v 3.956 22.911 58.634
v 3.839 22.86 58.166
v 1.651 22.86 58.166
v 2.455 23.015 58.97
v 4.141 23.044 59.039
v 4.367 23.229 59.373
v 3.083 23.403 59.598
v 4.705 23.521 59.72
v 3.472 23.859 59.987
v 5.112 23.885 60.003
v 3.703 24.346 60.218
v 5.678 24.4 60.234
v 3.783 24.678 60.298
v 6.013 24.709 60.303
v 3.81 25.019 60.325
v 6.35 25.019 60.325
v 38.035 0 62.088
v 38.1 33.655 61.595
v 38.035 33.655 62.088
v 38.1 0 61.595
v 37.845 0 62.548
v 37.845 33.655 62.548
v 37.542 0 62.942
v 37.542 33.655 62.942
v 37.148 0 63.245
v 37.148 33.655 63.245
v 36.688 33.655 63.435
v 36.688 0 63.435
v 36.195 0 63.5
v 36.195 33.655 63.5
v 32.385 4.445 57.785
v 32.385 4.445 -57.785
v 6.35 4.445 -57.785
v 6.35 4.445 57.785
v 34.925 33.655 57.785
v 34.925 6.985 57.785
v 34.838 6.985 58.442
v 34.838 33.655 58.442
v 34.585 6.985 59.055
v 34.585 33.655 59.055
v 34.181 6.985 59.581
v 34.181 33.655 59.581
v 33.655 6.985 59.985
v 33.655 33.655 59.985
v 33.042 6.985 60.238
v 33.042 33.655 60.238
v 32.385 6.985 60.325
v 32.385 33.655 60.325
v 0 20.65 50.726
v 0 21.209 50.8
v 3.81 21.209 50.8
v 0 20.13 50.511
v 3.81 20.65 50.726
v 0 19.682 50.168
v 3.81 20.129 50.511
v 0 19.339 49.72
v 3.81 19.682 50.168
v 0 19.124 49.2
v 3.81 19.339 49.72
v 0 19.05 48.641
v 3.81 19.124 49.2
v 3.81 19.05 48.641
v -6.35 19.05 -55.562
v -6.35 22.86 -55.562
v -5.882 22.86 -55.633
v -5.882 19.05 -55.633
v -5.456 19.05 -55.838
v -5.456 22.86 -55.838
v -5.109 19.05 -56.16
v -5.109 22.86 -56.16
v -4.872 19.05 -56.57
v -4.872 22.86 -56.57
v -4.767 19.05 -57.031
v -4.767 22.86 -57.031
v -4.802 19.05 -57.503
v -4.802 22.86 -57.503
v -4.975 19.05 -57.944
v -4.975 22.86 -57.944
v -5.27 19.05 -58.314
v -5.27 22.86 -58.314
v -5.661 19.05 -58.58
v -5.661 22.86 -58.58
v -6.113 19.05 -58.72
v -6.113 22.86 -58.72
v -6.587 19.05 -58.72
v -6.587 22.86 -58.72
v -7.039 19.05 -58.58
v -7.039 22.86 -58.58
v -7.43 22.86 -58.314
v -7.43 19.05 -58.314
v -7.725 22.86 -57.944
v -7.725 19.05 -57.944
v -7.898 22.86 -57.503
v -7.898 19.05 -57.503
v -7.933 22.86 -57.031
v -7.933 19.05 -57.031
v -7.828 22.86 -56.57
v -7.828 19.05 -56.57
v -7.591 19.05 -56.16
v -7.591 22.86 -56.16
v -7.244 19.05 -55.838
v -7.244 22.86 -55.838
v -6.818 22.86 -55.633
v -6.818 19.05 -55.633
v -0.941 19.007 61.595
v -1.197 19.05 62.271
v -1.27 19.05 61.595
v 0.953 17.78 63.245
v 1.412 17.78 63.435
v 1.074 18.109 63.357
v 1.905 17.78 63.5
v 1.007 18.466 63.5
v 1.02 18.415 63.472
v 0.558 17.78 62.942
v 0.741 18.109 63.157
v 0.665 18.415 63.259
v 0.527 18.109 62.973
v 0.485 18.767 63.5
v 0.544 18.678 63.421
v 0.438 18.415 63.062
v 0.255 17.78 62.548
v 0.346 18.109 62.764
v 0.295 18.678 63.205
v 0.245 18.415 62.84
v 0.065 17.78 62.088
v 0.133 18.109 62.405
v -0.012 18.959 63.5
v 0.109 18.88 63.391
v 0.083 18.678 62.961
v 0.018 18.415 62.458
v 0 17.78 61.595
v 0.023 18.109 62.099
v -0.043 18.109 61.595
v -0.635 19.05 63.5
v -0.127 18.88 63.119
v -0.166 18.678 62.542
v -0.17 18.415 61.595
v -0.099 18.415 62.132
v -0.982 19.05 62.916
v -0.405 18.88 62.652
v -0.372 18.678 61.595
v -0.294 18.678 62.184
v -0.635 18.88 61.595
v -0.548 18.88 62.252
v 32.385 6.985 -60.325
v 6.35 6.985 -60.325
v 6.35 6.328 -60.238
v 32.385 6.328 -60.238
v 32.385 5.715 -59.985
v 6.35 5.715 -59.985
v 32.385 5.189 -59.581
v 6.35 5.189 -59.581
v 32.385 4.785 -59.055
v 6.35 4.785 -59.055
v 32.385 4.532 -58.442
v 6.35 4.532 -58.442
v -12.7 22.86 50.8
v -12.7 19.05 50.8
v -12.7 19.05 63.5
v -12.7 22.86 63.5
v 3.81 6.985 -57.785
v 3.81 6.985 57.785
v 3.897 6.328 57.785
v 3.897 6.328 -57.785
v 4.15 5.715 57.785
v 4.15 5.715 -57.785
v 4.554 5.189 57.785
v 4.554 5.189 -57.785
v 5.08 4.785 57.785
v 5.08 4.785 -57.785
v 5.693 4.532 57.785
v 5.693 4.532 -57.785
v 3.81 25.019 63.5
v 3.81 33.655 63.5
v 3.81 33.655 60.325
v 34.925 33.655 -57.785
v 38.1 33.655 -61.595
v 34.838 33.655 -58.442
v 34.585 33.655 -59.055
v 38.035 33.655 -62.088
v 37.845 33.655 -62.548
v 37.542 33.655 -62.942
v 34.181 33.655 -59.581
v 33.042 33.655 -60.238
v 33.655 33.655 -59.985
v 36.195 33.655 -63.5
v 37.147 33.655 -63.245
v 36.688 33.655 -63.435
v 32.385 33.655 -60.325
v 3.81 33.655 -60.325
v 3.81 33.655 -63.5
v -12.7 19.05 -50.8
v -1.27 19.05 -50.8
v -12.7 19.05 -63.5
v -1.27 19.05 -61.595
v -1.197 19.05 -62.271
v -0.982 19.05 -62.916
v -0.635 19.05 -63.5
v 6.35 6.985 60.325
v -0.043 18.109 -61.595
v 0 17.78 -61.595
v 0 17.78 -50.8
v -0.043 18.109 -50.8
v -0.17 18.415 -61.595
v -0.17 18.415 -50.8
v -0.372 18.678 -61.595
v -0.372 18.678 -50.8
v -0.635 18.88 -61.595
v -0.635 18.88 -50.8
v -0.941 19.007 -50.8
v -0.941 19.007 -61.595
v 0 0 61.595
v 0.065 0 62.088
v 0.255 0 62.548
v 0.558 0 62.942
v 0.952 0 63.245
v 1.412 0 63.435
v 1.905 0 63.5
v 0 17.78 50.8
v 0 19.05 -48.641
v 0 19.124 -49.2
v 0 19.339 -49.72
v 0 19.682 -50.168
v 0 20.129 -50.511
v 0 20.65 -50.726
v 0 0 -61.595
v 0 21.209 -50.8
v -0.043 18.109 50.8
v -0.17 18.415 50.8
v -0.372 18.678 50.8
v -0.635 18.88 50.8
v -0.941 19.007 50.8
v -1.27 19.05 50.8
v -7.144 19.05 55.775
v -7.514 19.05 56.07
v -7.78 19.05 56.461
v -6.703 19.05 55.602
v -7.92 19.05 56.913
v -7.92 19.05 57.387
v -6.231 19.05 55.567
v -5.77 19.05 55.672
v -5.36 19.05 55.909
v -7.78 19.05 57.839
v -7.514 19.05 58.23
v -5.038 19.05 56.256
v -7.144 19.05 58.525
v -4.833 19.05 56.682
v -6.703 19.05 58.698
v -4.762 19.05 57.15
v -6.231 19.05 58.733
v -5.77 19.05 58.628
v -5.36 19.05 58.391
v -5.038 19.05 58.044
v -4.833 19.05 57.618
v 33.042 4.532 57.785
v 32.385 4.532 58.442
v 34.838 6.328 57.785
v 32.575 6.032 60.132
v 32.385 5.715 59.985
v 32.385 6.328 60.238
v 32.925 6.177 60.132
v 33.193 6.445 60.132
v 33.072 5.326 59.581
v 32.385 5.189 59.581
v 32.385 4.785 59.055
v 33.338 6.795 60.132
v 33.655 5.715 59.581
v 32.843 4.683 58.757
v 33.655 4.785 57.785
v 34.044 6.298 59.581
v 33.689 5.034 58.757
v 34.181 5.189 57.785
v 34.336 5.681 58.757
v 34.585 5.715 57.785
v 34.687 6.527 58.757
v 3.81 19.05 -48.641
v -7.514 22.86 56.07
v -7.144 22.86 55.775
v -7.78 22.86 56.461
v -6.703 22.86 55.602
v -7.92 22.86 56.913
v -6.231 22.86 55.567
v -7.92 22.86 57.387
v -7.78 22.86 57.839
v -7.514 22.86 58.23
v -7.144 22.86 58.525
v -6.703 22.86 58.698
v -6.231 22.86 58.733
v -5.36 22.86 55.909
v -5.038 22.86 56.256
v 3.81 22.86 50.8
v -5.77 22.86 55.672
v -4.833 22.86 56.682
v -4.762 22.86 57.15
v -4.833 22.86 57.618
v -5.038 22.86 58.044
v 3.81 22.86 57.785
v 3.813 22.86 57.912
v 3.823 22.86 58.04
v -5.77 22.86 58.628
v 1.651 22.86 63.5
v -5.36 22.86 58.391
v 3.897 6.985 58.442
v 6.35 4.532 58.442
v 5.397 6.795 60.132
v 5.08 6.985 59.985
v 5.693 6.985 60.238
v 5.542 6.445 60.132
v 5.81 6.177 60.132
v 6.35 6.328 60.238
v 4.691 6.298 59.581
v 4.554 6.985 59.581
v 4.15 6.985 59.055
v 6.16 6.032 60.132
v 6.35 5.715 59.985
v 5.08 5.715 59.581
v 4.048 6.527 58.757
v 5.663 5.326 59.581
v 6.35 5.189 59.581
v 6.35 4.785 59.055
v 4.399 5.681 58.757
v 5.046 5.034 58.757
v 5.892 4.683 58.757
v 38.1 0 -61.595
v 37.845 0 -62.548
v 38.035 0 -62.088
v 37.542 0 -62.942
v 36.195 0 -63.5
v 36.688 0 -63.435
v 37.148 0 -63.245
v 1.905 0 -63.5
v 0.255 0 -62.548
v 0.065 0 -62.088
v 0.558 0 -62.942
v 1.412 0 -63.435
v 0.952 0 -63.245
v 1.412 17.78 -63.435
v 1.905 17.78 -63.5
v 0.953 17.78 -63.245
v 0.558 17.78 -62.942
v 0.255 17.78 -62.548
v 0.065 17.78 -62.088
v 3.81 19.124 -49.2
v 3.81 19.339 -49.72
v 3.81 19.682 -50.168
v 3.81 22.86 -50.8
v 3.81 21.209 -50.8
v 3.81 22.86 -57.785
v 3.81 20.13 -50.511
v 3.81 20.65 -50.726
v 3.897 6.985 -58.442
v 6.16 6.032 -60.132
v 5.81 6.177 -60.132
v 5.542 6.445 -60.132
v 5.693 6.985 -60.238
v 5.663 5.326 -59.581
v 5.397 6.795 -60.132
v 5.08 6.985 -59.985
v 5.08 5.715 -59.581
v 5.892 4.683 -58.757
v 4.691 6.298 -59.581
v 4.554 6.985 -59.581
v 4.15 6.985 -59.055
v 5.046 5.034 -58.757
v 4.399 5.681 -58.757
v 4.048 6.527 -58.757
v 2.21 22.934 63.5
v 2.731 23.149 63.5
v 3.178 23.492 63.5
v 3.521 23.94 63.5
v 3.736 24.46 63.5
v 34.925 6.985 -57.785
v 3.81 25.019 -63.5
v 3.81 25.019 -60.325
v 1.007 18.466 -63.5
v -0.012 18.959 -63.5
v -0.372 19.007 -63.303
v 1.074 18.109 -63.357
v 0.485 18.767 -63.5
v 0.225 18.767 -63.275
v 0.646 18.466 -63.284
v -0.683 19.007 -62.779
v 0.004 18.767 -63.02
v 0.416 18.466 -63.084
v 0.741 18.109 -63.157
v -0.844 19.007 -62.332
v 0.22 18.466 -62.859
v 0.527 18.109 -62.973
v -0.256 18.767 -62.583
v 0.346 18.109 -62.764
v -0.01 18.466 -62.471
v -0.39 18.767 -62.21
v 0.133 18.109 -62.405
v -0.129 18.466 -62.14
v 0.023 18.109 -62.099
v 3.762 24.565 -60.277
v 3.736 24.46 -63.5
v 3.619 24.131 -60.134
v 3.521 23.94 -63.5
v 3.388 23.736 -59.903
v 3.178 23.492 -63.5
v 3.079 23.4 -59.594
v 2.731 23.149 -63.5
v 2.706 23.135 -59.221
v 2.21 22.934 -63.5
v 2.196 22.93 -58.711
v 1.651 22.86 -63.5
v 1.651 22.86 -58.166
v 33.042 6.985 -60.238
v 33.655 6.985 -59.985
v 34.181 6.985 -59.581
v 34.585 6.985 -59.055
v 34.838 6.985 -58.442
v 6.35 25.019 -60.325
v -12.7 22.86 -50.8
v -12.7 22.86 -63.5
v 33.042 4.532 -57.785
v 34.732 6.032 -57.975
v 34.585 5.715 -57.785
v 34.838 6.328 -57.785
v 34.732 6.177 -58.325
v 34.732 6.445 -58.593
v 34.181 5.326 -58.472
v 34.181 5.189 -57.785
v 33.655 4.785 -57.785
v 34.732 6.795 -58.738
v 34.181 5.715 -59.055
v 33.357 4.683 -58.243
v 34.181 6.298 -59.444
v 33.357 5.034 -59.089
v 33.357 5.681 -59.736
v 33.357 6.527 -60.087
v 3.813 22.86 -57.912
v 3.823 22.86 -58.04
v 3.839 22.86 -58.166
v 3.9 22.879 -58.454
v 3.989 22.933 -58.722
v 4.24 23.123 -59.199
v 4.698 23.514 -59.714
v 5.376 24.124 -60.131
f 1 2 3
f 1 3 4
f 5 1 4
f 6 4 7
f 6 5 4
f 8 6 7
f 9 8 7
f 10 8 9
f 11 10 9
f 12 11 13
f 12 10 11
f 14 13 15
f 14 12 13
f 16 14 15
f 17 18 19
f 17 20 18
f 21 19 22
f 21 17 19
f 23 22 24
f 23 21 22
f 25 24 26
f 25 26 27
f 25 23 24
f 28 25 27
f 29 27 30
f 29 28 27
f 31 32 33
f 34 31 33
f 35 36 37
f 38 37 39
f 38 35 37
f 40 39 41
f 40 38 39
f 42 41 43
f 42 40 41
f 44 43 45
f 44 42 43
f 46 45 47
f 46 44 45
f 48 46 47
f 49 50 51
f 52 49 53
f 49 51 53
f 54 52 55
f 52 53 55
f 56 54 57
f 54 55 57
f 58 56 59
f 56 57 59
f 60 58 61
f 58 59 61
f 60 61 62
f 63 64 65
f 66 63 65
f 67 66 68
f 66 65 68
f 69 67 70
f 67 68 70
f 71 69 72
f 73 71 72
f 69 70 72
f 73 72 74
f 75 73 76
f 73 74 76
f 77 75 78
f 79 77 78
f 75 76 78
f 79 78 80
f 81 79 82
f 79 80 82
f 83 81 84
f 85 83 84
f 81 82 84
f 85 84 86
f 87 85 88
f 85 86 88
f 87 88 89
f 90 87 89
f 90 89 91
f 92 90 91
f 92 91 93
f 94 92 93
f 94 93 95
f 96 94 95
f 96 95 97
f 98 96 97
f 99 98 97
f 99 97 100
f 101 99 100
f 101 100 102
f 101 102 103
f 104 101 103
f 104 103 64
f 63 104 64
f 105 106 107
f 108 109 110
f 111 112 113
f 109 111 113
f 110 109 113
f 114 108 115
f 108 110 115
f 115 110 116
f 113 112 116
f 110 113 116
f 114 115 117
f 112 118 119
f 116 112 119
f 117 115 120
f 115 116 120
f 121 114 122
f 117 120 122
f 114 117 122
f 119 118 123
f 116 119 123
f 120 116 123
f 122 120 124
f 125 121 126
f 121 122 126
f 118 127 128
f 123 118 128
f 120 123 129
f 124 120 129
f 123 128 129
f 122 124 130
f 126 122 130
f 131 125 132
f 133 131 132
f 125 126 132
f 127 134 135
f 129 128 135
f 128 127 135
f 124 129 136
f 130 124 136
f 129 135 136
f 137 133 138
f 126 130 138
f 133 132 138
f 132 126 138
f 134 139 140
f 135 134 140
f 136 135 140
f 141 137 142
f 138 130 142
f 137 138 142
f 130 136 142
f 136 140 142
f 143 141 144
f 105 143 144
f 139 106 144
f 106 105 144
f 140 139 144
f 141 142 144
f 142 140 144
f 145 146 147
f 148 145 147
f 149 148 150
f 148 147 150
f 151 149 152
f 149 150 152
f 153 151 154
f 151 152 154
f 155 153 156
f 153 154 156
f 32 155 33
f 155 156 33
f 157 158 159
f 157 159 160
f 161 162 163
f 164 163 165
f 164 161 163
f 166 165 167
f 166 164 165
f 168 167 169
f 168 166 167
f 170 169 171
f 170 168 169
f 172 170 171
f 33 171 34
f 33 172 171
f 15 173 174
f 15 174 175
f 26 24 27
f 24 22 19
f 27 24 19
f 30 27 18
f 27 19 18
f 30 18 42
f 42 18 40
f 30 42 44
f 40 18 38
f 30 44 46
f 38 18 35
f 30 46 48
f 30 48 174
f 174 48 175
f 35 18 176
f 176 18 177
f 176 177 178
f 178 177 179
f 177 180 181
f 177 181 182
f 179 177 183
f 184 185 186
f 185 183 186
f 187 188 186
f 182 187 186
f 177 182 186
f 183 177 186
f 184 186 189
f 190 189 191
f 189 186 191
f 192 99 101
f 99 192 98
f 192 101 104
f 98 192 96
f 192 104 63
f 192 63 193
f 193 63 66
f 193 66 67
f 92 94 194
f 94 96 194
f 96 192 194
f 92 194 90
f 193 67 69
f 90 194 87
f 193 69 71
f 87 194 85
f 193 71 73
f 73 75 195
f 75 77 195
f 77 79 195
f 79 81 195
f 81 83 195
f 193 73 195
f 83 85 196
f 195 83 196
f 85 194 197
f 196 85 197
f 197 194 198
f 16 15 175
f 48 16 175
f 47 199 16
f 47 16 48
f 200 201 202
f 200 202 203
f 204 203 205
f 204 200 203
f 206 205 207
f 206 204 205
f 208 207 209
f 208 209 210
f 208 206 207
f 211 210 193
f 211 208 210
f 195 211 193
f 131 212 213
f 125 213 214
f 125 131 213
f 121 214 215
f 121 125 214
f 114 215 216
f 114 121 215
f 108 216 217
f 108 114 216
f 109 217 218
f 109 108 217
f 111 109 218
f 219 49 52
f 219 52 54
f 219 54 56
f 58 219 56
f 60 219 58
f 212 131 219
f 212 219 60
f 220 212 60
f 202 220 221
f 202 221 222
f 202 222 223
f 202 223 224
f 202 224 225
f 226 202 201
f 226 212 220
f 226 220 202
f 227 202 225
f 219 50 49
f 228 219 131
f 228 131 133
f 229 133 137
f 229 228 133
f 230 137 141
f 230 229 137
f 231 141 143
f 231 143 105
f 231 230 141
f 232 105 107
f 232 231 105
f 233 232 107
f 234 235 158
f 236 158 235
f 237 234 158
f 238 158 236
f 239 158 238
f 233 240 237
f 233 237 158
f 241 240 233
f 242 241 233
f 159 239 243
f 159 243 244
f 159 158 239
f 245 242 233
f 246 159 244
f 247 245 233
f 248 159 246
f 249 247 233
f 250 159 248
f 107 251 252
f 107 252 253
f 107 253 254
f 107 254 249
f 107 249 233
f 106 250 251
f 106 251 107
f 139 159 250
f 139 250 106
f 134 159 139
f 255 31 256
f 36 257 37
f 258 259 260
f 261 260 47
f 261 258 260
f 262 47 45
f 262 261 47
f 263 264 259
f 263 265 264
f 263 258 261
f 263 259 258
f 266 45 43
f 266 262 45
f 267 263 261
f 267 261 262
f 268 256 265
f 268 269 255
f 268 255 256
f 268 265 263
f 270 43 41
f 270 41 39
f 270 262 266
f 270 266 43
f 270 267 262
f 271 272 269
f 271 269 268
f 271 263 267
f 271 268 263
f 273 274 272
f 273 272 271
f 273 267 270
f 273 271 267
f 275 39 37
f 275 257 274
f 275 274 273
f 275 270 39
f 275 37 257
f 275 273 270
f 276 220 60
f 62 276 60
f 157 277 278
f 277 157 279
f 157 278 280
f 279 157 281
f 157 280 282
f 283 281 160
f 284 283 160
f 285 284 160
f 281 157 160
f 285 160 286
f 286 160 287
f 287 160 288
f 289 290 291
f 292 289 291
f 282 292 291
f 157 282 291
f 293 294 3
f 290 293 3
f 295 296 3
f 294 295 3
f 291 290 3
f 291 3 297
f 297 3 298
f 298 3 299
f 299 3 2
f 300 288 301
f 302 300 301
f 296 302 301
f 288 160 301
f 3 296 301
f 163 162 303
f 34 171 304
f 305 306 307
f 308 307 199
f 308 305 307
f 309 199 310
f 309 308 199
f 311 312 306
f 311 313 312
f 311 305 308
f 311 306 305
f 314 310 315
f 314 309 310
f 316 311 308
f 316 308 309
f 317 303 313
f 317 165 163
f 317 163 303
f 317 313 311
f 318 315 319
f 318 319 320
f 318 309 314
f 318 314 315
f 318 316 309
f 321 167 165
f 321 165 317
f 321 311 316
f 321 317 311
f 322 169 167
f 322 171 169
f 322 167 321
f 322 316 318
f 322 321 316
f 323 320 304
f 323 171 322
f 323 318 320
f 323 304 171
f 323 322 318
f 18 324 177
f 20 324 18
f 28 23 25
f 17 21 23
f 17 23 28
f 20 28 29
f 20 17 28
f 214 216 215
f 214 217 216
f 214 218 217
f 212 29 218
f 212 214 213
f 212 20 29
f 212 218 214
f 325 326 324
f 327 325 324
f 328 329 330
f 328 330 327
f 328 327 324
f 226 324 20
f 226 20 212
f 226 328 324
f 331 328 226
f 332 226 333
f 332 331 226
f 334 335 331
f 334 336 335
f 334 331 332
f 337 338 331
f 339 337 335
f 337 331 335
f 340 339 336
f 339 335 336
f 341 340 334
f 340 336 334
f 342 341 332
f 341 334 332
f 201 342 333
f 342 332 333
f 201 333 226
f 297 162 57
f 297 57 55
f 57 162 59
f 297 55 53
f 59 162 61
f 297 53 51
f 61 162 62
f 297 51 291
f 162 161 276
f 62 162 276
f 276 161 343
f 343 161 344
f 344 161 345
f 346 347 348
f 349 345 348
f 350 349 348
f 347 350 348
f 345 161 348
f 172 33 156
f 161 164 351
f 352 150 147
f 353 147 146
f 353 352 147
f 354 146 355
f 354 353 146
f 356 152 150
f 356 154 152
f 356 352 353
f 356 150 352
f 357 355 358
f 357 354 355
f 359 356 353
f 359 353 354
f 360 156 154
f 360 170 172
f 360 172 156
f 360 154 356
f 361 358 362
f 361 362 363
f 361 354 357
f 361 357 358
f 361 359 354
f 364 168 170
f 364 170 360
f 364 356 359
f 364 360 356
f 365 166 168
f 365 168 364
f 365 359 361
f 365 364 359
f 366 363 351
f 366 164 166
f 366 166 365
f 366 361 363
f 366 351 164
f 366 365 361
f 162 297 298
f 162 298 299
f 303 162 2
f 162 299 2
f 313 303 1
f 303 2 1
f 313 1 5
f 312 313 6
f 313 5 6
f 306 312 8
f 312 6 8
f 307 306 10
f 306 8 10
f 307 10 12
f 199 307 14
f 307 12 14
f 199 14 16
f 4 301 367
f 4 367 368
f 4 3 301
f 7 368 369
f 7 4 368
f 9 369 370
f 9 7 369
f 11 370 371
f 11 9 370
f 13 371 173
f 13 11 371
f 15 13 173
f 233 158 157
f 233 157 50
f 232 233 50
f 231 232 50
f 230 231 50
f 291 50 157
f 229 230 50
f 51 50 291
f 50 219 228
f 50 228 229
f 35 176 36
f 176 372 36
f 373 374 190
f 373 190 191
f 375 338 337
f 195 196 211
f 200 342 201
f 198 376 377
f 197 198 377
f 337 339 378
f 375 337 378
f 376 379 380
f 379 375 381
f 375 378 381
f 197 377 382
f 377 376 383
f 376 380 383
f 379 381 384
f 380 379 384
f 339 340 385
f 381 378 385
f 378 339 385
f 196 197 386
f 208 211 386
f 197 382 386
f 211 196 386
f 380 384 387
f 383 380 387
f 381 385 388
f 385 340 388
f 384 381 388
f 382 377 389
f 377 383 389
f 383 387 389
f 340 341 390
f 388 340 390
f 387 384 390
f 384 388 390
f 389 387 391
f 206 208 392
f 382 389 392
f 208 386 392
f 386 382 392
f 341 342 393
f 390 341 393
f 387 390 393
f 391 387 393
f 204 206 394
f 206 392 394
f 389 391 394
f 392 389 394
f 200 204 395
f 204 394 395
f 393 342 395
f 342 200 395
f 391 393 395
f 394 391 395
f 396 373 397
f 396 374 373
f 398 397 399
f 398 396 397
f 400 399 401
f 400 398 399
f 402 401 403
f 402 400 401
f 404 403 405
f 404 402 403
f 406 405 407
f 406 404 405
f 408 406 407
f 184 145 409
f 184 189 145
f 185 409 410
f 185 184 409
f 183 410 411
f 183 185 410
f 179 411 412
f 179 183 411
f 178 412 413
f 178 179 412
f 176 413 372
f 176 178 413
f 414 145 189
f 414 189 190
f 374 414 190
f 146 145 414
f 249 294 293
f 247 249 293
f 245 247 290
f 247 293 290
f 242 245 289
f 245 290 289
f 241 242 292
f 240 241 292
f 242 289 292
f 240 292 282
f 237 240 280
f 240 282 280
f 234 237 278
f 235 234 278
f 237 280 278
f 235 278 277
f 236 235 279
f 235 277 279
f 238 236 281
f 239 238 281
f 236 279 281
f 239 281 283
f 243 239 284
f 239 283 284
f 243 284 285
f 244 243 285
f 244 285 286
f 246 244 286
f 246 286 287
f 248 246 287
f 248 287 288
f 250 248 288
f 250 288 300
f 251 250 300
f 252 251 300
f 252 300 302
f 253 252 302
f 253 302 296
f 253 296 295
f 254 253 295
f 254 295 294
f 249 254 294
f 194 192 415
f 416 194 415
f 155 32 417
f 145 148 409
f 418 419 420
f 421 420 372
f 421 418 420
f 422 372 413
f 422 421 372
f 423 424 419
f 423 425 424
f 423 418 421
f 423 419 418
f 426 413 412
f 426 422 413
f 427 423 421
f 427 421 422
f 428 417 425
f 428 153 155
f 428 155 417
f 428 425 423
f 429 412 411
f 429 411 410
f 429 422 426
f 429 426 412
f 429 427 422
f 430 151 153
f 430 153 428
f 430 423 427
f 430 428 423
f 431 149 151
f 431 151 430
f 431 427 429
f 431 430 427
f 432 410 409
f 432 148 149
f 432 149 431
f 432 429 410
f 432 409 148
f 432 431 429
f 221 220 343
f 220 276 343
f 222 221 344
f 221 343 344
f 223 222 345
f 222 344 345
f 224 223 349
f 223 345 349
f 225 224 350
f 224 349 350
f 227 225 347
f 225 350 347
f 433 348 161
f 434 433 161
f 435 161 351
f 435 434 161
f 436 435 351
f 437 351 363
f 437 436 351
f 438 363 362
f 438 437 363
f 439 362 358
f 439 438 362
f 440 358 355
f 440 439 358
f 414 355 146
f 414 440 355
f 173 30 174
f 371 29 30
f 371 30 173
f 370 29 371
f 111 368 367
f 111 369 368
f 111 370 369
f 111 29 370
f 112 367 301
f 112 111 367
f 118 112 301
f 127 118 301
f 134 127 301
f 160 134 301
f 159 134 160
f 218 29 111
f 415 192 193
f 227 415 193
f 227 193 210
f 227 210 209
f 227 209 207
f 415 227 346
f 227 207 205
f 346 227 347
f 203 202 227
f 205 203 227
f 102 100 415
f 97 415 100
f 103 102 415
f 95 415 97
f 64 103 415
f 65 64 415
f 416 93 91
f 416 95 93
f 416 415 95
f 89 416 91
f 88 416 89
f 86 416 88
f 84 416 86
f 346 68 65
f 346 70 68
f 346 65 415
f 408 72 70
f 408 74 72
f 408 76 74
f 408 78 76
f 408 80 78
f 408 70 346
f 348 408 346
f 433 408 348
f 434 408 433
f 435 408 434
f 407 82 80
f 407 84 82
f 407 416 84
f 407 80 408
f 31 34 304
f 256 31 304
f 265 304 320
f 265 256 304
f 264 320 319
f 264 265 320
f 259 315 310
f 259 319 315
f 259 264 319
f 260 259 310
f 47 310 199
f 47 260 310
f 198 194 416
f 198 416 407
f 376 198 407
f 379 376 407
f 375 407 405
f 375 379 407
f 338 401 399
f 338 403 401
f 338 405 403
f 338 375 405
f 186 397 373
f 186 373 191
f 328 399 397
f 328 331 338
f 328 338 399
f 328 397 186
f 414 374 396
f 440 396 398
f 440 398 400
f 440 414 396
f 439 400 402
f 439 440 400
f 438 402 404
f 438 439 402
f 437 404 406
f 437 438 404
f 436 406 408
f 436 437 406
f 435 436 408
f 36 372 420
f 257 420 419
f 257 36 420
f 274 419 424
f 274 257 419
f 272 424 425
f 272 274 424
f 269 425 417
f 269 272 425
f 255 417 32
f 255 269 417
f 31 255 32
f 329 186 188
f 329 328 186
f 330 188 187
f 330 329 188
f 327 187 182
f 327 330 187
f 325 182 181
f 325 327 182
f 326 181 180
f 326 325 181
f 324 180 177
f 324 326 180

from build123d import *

# Parameters (mm, degrees)
BOSS_EXTRUDE1_DEPTH = 4.445
SKETCH2_W           = 127
SKETCH2_H           = 19.05
BOSS_EXTRUDE2_DEPTH = 3.81
SKETCH3_W           = 16.51
SKETCH3_H           = 3.81
BOSS_EXTRUDE3_DEPTH = 12.7
SKETCH4_R           = 1.5875
CUT_EXTRUDE1_DEPTH  = 78.501223216
WALLS_DEPTH         = 29.21
FILLET5_R           = 2.54
FILLET7_R           = 1.905
FILLET8_R           = 2.159
FILLET9_R           = 1.27


with BuildPart() as part:
    # Sketch1 → Boss-Extrude1 (new body)
    with BuildSketch(Plane(origin=(0, 0, 0), x_dir=(1, 0, 0), z_dir=(0, 1, 0))):
        Polygon((0, -63.5), (0, 63.5), (3.81, 63.5), (38.1, 63.5), (38.1, -63.5), (3.81, -63.5), align=None)
    extrude(amount=BOSS_EXTRUDE1_DEPTH)

    # Sketch2 → Boss-Extrude2 (add)
    with BuildSketch(Plane.ZY):
        with Locations((0, 9.525)):
            Rectangle(SKETCH2_W, SKETCH2_H)
    extrude(amount=-BOSS_EXTRUDE2_DEPTH)

    # Sketch3 → Boss-Extrude3 (add)
    with BuildSketch(Plane.XY.offset(63.5)):
        with Locations((-4.445, 20.955)):
            Rectangle(SKETCH3_W, SKETCH3_H)
    boss_extrude3 = extrude(amount=-BOSS_EXTRUDE3_DEPTH)

    # Mirror1: Boss-Extrude3 across plane
    add(boss_extrude3.mirror(Plane.XY))

    # Sketch4 → Cut-Extrude1 (cut, through all)
    with BuildSketch(Plane(origin=(0, 22.86, 0), x_dir=(1, 0, 0), z_dir=(0, 1, 0))):
        with Locations(Location((-6.35, 57.15, 0), (0, 0, 270))):
            Circle(SKETCH4_R)
        with Locations((-6.35, -57.15)):
            Circle(SKETCH4_R)
    extrude(amount=-CUT_EXTRUDE1_DEPTH, mode=Mode.SUBTRACT)

    # Sketch6 → Walls (add)
    with BuildSketch(Plane(origin=(0, 4.445, 0), x_dir=(1, 0, 0), z_dir=(0, 1, 0))):
        Polygon((3.81, 63.5), (38.1, 63.5), (38.1, -63.5), (3.81, -63.5), (3.81, -60.325), (34.925, -60.325), (34.925, 0), (34.925, 60.325), (3.81, 60.325), align=None)
    extrude(amount=WALLS_DEPTH)

    # Fillet5
    fillet5_edges = [part.edges().sort_by_distance(p)[0] for p in [
        (3.81, 4.445, 0),
        (3.81, 13.6525, 60.325),
        (19.3675, 4.445, -60.325),
        (3.81, 13.6525, -60.325),
        (34.925, 4.445, 0),
        (34.925, 19.05, -60.325),
        (19.3675, 4.445, 60.325),
        (34.925, 19.05, 60.325),
    ]]
    fillet(fillet5_edges, radius=FILLET5_R)

    # Fillet7
    fillet7_edges = [part.edges().sort_by_distance(p)[0] for p in [
        (38.1, 16.8275, -63.5),
        (38.1, 16.8275, 63.5),
        (0, 9.525, 63.5),
        (0, 9.525, -63.5),
    ]]
    fillet(fillet7_edges, radius=FILLET7_R)

    # Fillet8
    fillet8_edges = [part.edges().sort_by_distance(p)[0] for p in [
        (5.08, 22.86, 60.325),
        (5.08, 22.86, -60.325),
        (1.905, 19.05, 50.8),
        (1.905, 19.05, -50.8),
        (3.81, 22.86, -61.9125),
        (3.81, 22.86, 61.9125),
    ]]
    fillet(fillet8_edges, radius=FILLET8_R)

    # Fillet9
    # the kernel refuses this fillet: 1.27 mm, written as the material it adds along each edge
    with BuildSketch(Plane(origin=(0, 19.05, 50.8), x_dir=(-1, 0, 0), z_dir=(0, 0, 1)), Plane(origin=(0, 19.05, -61.595), x_dir=(-1, 0, 0), z_dir=(0, 0, 1))) as fillet9_piece_1:
        with BuildLine():
            CenterArc((FILLET9_R, FILLET9_R), FILLET9_R, 180, 90)
            Line((0, FILLET9_R), (0, 0))
            Line((0, 0), (FILLET9_R, 0))
        make_face()
    extrude(amount=10.795)
    with BuildSketch(Plane(origin=(1.905, 19.05, -61.595), x_dir=(0.995343646445092, 0, 0.09638996566752997), z_dir=(-0.09638996566752997, 0, 0.995343646445092))) as fillet9_piece_2_section:
        with BuildLine():
            CenterArc((1.905 + FILLET9_R, -FILLET9_R), FILLET9_R, 90, 90)
            Line((1.905, -FILLET9_R), (1.905, 0))
            Line((1.905, 0), (1.905 + FILLET9_R, 0))
        make_face()
    fillet9_piece_2 = revolve(axis=Axis((1.905, 19.05, -61.595), (0, 1, 0)), revolution_arc=185.531326158, mode=Mode.PRIVATE)
    fillet9_piece_2 = split(fillet9_piece_2, bisect_by=Plane(origin=(1.905, 19.05, -63.5), z_dir=(0, 0, 1)), keep=Keep.TOP, mode=Mode.PRIVATE)
    add(fillet9_piece_2)
    with BuildSketch(Plane(origin=(1.905, 19.05, 61.595), x_dir=(0.995343646445092, 0, -0.09638996566752997), z_dir=(-0.09638996566752997, 0, -0.995343646445092))) as fillet9_piece_3_section:
        with BuildLine():
            CenterArc((1.905 + FILLET9_R, FILLET9_R), FILLET9_R, 180, 90)
            Line((1.905 + FILLET9_R, 0), (1.905, 0))
            Line((1.905, 0), (1.905, FILLET9_R))
        make_face()
    fillet9_piece_3 = revolve(axis=Axis((1.905, 19.05, 61.595), (0, -1, 0)), revolution_arc=185.531326158, mode=Mode.PRIVATE)
    fillet9_piece_3 = split(fillet9_piece_3, bisect_by=Plane(origin=(1.905, 19.05, 63.5), z_dir=(0, 0, -1)), keep=Keep.TOP, mode=Mode.PRIVATE)
    add(fillet9_piece_3)


solid = part.part
